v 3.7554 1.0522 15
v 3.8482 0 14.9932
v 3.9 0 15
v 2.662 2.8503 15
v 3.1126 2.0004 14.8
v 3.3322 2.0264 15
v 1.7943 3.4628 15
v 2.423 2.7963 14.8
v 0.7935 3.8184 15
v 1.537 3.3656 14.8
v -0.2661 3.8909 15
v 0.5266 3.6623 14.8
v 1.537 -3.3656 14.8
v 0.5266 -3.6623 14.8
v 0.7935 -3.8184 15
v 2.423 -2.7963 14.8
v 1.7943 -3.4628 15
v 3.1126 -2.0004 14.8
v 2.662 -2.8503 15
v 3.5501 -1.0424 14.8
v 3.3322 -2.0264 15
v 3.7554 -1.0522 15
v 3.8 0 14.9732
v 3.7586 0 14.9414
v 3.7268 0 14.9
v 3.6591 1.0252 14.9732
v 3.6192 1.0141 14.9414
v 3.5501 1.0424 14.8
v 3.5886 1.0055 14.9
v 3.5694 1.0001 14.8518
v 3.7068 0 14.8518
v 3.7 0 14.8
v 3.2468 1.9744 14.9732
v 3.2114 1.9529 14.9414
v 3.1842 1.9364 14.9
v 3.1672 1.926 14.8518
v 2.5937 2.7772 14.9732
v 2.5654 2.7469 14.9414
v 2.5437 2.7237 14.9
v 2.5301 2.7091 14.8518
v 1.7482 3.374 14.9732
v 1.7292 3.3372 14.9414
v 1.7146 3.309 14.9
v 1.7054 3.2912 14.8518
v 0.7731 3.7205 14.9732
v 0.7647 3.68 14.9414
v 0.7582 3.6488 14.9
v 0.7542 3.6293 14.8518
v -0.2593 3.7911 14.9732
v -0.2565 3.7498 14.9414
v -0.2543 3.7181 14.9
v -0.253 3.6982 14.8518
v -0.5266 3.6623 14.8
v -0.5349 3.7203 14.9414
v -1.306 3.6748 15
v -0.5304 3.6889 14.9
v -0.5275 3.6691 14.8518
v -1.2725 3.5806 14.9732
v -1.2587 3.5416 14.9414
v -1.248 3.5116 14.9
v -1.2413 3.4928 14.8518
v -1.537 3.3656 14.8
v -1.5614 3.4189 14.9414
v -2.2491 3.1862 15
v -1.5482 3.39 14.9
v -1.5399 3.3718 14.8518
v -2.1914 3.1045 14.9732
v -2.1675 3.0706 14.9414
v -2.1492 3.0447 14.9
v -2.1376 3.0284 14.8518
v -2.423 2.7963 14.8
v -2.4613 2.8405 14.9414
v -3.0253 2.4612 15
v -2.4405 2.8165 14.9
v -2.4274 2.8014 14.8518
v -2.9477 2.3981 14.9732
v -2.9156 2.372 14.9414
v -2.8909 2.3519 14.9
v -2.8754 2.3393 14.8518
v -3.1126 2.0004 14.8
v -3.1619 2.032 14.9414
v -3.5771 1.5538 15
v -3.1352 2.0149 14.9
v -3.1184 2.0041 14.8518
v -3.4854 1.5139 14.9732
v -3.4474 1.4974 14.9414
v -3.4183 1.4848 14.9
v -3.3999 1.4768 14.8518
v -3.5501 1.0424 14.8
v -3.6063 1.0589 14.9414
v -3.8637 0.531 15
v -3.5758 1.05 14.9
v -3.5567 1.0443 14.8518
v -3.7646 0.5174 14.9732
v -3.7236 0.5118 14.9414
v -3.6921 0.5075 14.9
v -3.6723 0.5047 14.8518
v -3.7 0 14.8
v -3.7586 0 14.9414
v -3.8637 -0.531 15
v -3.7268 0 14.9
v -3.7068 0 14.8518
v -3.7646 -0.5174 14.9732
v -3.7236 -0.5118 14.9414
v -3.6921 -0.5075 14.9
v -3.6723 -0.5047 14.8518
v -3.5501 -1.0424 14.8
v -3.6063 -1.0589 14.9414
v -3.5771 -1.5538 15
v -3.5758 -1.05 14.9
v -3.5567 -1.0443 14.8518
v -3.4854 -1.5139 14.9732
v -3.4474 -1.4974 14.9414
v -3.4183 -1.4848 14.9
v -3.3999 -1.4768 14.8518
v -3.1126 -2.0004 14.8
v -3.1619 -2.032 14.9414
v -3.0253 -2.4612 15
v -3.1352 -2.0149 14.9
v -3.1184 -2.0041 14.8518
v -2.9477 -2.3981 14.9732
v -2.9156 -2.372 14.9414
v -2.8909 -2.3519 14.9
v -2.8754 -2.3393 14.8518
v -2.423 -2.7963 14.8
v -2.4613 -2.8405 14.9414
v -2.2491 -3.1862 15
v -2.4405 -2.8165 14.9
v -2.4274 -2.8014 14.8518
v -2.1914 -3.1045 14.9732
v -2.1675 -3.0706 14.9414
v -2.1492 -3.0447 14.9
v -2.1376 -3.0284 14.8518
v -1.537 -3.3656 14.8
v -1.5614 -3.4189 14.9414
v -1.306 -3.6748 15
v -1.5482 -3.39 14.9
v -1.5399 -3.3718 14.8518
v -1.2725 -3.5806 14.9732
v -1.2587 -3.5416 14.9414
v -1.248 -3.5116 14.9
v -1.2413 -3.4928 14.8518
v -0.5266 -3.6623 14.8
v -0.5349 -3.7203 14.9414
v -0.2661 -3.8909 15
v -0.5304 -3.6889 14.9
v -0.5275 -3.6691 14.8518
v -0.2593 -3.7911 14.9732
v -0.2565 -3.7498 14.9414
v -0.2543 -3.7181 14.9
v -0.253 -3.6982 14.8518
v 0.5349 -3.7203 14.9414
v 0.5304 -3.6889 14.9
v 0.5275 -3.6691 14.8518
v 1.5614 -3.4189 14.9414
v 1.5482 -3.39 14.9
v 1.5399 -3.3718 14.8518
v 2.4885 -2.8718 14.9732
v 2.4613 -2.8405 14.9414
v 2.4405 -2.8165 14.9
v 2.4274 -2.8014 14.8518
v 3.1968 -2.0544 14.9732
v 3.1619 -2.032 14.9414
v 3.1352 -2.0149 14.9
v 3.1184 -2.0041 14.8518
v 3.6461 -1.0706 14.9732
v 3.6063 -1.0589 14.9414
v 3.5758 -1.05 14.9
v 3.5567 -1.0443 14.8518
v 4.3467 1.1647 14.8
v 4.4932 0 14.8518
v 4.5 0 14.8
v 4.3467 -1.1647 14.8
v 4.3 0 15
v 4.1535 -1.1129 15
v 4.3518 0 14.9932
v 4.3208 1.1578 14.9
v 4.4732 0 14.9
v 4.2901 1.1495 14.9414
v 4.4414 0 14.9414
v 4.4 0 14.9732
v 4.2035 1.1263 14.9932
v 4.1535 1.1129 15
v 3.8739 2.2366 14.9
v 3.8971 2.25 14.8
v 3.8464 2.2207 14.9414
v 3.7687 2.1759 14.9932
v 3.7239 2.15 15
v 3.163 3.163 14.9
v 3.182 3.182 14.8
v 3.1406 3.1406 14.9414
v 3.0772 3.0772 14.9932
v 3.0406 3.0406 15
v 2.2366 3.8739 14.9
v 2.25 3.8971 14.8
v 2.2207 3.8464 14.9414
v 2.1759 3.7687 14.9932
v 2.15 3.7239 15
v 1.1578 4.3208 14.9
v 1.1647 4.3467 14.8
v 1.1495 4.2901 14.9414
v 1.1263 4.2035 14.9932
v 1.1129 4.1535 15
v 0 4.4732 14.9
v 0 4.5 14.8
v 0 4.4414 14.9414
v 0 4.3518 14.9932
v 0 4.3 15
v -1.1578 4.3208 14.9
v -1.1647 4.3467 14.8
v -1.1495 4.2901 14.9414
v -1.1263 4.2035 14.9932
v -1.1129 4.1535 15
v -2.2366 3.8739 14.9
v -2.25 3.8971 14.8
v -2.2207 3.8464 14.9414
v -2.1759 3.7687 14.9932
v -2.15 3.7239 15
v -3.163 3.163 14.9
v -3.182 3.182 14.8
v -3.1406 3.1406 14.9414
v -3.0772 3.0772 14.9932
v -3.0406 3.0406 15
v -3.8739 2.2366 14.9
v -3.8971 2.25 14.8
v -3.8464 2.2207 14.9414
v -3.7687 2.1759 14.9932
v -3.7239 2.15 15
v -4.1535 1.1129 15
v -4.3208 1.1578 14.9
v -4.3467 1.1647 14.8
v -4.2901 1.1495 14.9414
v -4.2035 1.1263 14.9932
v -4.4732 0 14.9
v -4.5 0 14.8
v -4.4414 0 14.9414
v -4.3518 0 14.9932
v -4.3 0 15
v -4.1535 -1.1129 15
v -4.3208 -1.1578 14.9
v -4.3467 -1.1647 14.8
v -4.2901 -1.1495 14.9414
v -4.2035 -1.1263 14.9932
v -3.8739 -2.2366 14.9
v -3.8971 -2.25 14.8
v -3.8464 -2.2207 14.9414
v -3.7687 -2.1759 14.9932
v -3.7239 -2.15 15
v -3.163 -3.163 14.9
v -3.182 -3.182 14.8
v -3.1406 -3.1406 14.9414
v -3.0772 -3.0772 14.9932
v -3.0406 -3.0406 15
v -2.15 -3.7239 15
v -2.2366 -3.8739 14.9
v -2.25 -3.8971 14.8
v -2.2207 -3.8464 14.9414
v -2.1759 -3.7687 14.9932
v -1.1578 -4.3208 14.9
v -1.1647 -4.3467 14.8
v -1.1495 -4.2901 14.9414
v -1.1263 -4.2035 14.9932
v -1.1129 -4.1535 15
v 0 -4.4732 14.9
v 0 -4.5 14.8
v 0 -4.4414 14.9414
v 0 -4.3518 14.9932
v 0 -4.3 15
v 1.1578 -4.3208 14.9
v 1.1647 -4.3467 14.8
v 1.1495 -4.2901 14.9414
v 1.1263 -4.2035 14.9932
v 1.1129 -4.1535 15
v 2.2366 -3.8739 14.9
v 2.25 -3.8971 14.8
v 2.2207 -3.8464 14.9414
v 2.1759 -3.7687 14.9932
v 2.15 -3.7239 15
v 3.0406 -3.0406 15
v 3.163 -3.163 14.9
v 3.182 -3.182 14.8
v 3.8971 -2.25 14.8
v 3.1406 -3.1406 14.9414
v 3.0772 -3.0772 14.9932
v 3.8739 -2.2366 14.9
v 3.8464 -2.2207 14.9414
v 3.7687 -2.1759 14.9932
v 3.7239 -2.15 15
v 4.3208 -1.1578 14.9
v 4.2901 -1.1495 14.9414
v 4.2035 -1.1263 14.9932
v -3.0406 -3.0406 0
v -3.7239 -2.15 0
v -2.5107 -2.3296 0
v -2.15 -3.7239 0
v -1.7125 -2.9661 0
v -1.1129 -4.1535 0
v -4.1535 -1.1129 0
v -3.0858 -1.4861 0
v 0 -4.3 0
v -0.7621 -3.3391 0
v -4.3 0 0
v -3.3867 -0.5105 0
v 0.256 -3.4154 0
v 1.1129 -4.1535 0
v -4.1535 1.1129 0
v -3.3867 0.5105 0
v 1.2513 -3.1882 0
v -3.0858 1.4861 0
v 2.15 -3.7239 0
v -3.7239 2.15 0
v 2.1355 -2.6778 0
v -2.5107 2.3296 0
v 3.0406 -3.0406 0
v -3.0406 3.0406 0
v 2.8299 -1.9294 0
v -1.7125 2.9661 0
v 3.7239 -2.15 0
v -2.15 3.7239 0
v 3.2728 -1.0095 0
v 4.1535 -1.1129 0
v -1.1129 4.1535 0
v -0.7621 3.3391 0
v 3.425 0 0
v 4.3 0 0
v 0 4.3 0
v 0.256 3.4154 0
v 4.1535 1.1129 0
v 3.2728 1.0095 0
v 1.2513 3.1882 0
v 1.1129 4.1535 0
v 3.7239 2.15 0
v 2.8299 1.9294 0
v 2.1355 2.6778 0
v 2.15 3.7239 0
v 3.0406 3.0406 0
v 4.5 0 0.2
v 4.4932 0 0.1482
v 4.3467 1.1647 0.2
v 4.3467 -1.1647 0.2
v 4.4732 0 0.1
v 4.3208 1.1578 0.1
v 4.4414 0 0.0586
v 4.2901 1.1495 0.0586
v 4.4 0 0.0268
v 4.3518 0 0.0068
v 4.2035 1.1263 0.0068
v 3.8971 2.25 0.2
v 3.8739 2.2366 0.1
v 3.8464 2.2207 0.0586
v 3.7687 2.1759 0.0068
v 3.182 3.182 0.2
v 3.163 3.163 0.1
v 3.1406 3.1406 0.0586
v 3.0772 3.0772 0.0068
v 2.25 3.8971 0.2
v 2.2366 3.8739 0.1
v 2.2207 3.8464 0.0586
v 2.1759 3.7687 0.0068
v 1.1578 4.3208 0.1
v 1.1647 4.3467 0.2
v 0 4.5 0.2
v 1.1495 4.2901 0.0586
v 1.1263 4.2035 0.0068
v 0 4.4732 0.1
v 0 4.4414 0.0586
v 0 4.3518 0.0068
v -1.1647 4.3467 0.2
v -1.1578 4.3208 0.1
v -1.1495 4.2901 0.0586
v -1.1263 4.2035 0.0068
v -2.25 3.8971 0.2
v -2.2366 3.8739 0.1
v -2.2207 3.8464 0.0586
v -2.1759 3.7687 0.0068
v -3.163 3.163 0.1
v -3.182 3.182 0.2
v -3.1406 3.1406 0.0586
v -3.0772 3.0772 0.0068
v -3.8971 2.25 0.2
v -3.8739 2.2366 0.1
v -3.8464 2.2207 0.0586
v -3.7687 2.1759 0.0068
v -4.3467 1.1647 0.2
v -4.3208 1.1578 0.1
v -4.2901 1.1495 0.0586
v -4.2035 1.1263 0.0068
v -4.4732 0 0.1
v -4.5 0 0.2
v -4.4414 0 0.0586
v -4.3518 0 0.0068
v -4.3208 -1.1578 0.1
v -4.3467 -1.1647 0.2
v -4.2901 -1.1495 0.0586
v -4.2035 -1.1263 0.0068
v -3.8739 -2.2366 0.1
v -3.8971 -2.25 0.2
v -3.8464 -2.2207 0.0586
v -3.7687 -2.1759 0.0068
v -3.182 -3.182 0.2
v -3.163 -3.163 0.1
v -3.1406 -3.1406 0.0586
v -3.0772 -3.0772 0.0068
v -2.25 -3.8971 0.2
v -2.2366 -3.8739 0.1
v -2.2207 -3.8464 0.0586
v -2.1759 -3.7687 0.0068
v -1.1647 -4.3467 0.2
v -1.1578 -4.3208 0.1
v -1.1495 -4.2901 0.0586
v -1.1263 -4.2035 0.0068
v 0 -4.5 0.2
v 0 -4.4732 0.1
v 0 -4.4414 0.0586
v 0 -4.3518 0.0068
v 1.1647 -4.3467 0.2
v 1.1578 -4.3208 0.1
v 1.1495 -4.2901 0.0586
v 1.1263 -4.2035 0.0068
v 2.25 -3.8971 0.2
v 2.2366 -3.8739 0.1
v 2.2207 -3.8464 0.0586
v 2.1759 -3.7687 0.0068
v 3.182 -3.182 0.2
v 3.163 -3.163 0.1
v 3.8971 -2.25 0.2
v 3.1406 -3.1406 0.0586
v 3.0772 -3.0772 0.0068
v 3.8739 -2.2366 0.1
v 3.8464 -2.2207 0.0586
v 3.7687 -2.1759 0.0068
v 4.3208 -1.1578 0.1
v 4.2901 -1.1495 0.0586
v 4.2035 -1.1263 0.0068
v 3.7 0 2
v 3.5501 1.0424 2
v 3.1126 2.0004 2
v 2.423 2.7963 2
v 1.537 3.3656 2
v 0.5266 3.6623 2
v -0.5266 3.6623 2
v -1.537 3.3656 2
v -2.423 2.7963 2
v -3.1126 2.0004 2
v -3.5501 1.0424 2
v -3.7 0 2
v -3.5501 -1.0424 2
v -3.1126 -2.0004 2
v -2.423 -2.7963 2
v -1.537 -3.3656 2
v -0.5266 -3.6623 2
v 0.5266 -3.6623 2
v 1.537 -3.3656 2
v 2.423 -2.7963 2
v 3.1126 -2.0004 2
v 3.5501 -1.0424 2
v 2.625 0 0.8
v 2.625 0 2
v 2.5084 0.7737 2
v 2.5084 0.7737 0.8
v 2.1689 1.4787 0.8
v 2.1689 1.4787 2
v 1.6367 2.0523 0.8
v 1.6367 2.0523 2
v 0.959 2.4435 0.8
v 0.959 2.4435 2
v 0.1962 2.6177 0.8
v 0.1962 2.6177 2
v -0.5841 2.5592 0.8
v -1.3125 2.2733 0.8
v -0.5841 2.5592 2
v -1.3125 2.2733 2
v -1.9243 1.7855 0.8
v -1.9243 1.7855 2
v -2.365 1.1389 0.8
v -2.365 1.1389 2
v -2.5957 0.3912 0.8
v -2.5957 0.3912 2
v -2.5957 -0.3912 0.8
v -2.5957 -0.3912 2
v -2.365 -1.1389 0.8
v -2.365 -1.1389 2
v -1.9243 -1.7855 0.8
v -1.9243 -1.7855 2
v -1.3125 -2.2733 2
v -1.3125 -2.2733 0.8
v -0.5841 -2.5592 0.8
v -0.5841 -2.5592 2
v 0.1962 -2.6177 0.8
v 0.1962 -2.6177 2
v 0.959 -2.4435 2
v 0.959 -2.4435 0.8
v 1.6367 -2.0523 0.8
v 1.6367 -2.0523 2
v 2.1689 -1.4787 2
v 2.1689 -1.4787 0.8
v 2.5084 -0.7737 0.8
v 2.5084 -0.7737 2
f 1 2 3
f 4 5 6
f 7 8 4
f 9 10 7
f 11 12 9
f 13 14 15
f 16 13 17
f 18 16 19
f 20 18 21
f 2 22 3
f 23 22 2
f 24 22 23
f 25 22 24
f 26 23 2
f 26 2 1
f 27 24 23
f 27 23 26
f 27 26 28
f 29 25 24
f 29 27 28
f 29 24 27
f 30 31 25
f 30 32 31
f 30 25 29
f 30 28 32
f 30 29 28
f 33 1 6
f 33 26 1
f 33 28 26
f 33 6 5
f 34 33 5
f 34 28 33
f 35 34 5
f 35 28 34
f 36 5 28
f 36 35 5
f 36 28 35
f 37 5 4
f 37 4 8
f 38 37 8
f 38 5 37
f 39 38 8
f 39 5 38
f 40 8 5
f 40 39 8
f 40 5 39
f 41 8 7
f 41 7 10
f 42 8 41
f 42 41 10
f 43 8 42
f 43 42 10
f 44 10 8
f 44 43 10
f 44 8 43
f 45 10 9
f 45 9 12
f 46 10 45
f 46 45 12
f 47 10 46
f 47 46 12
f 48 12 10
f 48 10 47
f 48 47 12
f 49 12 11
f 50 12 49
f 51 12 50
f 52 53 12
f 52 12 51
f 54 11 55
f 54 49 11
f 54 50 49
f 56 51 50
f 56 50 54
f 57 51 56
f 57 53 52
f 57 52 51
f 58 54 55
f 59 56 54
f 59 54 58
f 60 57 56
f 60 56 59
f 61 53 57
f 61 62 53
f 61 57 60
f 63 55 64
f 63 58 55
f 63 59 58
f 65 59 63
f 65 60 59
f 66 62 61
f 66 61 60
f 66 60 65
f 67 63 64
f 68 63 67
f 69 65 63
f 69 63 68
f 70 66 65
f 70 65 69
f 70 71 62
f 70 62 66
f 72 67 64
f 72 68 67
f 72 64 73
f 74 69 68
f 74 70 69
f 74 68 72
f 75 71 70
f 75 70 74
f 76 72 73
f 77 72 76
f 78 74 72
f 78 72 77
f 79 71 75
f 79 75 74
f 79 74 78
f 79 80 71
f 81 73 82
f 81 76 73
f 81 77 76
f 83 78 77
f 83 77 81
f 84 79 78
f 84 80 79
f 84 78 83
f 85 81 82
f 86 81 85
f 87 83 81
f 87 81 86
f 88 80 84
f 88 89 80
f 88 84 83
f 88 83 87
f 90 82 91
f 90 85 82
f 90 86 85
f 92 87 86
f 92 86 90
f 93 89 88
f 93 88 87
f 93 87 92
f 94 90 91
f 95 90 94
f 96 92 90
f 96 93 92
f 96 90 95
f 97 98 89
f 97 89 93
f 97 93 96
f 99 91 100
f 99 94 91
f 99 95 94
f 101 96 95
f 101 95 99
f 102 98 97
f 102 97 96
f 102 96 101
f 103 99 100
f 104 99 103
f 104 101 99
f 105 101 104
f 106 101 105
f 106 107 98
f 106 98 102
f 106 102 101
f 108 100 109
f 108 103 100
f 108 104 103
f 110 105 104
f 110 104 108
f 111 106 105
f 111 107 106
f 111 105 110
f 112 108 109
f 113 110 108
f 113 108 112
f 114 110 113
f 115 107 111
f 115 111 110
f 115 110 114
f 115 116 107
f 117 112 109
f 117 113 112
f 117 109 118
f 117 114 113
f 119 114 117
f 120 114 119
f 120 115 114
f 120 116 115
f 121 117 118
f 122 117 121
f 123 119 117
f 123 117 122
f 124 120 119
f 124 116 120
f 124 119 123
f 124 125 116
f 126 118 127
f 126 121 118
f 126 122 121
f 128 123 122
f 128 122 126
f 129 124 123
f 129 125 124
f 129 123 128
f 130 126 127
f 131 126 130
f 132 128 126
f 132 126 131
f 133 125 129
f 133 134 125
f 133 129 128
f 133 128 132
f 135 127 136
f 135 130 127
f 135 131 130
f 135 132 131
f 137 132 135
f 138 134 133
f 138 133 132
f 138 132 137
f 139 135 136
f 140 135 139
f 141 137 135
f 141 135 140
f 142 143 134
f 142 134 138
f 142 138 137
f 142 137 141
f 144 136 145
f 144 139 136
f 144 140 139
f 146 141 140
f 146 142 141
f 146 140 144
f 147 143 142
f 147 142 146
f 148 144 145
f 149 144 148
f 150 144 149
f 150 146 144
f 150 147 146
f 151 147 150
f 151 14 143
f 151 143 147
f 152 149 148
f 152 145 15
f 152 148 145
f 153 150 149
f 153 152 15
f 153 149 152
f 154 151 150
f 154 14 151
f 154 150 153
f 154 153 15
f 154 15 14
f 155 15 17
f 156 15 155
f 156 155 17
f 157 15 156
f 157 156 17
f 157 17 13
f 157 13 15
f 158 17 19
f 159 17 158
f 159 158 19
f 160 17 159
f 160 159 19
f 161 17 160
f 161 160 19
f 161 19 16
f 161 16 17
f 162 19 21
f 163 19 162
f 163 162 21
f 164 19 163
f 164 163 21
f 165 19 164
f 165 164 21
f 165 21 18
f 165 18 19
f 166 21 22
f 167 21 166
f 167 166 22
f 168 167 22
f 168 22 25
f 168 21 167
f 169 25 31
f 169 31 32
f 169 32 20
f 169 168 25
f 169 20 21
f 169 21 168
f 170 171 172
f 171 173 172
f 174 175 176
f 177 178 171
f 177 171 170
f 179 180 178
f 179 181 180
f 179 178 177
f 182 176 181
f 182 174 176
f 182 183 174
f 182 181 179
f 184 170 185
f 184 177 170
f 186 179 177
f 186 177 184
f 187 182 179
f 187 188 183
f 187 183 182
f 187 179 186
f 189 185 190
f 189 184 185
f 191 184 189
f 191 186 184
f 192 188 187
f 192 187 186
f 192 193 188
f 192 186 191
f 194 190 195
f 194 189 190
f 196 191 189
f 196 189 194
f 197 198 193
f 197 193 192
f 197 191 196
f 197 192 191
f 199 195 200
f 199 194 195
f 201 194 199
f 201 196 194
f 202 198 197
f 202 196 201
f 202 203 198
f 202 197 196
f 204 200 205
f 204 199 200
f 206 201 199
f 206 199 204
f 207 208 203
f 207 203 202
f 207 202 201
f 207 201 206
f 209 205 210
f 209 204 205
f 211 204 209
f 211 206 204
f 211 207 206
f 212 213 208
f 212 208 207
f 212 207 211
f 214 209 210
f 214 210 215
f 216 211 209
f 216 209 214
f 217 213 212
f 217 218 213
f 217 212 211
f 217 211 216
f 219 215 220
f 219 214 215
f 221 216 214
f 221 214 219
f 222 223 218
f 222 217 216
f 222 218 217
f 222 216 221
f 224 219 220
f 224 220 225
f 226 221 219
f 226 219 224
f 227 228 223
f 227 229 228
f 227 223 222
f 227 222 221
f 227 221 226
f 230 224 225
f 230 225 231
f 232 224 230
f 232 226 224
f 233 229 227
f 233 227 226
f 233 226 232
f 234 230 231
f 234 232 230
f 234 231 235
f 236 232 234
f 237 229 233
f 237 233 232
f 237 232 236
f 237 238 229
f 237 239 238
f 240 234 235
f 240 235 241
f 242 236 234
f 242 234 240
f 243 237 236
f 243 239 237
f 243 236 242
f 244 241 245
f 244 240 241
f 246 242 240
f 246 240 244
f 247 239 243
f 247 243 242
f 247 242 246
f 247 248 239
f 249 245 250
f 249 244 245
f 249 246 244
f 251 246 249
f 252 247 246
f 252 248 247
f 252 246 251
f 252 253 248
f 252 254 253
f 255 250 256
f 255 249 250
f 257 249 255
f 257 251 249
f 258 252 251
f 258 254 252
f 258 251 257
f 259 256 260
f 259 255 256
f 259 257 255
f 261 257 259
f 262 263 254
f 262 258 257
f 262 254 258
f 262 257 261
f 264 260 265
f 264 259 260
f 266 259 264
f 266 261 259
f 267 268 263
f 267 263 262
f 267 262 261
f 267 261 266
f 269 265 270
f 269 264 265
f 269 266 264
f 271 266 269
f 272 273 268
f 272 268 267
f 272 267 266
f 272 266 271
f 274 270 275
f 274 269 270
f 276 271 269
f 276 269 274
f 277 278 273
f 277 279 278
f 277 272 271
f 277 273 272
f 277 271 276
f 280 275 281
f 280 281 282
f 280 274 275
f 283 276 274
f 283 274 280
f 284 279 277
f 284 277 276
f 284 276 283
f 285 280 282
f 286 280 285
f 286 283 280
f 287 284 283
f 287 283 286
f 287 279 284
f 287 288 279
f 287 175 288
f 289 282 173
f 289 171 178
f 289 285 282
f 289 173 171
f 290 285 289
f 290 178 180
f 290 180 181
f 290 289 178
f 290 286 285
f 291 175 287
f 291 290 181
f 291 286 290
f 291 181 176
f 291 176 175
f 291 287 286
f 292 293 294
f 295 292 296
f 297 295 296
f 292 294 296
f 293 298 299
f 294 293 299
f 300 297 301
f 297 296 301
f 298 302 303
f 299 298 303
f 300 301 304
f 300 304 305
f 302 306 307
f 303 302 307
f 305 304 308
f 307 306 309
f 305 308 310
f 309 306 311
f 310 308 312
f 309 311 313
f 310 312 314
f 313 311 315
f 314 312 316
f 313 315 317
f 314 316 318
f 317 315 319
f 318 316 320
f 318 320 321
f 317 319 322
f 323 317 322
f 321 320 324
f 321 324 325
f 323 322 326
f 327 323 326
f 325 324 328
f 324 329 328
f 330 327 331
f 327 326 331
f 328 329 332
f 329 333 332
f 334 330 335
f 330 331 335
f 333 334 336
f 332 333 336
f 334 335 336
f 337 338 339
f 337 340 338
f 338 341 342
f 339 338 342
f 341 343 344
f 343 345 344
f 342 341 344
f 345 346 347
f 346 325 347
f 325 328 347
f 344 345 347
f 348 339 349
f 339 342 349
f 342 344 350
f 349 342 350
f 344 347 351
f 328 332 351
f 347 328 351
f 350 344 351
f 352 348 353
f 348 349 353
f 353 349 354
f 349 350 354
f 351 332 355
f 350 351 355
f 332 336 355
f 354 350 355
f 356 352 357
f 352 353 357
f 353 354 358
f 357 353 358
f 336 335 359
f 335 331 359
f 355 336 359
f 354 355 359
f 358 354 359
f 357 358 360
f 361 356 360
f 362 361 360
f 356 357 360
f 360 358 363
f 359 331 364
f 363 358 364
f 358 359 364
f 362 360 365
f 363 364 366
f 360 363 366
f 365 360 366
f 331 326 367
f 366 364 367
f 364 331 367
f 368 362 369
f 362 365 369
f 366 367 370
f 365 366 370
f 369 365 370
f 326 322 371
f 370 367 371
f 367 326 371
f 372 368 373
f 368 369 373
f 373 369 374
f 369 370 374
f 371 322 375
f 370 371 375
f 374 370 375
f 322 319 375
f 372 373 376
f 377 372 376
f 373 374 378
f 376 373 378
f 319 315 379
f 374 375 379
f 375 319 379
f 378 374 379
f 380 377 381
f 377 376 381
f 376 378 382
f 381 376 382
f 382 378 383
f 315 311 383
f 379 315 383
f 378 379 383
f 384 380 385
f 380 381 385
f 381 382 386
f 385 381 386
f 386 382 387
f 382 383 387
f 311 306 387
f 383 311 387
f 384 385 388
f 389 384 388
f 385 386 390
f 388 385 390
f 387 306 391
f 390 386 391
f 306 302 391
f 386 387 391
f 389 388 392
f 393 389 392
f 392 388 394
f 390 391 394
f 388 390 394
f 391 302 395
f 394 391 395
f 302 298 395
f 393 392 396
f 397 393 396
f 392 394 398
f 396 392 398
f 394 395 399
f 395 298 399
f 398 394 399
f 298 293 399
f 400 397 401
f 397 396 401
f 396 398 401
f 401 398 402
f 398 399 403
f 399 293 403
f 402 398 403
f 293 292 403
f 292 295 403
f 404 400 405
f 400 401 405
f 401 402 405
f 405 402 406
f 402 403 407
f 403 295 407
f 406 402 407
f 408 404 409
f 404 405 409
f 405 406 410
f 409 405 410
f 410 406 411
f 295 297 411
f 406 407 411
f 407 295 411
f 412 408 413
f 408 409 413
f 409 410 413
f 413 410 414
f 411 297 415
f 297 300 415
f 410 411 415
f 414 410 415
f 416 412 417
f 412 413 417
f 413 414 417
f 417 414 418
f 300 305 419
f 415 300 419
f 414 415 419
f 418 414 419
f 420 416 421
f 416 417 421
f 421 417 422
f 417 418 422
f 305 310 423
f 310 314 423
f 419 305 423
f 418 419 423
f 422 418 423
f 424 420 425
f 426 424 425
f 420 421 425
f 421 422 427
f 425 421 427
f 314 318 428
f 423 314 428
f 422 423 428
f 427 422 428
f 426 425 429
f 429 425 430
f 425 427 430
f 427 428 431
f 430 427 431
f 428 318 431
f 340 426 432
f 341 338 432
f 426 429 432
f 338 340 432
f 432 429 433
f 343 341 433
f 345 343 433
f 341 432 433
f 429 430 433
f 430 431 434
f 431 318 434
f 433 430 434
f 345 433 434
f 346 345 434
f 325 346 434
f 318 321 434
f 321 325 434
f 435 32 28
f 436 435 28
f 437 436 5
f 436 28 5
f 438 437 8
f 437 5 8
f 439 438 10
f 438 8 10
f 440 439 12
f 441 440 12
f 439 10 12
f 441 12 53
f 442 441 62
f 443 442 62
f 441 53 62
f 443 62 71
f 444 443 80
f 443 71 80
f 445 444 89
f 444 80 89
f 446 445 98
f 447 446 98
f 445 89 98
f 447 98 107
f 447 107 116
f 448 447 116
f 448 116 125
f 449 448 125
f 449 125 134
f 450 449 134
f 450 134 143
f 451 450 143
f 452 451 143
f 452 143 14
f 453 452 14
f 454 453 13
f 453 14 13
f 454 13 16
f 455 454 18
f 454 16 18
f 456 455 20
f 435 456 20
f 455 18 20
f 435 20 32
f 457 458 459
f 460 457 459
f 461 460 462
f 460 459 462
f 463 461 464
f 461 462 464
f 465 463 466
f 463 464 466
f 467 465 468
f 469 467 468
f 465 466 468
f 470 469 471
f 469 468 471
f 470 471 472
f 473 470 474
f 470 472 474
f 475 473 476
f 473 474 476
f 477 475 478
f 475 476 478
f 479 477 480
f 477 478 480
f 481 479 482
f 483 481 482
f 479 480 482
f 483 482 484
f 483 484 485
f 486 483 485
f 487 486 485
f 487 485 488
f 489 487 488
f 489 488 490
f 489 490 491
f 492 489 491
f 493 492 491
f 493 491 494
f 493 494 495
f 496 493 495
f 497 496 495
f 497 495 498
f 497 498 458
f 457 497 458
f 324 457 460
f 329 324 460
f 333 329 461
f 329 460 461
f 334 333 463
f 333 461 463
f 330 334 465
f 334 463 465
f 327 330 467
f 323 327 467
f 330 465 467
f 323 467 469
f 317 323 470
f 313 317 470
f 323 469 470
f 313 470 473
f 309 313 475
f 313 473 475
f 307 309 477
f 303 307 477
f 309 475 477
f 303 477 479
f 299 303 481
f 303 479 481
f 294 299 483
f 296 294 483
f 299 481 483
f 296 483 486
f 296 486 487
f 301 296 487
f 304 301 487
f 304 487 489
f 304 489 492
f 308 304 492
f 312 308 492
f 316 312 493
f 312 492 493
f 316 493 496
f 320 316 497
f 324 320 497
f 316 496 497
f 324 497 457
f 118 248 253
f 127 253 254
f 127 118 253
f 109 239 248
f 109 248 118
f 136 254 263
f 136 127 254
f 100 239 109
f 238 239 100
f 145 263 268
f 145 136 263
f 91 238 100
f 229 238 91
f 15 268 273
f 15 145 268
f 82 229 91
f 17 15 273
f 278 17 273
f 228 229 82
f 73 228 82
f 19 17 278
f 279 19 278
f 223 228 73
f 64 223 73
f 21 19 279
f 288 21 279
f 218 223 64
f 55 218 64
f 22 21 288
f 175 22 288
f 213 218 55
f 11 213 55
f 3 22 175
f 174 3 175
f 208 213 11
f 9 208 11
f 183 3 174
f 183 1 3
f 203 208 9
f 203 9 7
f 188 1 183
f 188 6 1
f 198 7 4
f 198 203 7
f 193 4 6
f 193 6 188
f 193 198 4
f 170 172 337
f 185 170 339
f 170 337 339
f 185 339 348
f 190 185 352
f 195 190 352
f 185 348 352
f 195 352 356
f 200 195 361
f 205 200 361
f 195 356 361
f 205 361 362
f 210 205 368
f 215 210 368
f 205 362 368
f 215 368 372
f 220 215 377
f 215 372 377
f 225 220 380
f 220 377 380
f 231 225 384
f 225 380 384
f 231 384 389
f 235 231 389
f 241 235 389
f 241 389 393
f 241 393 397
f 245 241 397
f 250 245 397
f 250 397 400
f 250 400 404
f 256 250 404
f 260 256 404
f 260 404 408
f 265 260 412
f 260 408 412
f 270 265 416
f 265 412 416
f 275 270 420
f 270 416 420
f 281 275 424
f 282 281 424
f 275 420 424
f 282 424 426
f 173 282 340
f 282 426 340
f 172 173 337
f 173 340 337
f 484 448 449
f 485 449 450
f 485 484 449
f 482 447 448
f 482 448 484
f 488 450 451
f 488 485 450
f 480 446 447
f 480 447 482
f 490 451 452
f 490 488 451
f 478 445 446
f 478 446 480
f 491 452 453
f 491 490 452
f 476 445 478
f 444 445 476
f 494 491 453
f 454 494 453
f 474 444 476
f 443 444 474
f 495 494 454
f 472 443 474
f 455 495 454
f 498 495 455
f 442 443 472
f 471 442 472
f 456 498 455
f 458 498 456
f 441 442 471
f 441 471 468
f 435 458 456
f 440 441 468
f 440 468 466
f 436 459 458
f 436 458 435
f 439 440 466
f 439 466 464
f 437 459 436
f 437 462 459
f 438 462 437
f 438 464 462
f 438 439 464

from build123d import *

# Parameters (mm, degrees)
F0_R     = 4.5
F1_DEPTH = 15
F2_R     = 2.625
F3_DEPTH = 25
F2_R_2   = 3.7
F4_DEPTH = 13
F5_R     = 0.2
F6_SIZE  = 0.8


with BuildPart() as f1:
    # F0 (on Top) → F1 (new body)
    with BuildSketch(Plane.XY):
        Circle(F0_R)
    extrude(amount=F1_DEPTH)

    # F2 (on face) → F3 (cut)
    with BuildSketch(Plane.XY.offset(15)):
        Circle(F2_R)
    extrude(amount=-F3_DEPTH, mode=Mode.SUBTRACT)

    # F2 (on face) → F4 (cut)
    with BuildSketch(Plane.XY.offset(15)):
        Circle(F2_R_2)
        Circle(F2_R, mode=Mode.SUBTRACT)
    extrude(amount=-F4_DEPTH, mode=Mode.SUBTRACT)

    # F5
    f5_edges = [f1.edges().sort_by_distance(p)[0] for p in [
        (-4.5, 0, 15),
        (-3.7, 0, 15),
        (-4.5, 0, 0),
    ]]
    fillet(f5_edges, radius=F5_R)

    # F6
    f6_edges = [f1.edges().sort_by_distance(p)[0] for p in [
        (-2.625, 0, 0),
    ]]
    chamfer(f6_edges, length=F6_SIZE)


solid = f1.part
